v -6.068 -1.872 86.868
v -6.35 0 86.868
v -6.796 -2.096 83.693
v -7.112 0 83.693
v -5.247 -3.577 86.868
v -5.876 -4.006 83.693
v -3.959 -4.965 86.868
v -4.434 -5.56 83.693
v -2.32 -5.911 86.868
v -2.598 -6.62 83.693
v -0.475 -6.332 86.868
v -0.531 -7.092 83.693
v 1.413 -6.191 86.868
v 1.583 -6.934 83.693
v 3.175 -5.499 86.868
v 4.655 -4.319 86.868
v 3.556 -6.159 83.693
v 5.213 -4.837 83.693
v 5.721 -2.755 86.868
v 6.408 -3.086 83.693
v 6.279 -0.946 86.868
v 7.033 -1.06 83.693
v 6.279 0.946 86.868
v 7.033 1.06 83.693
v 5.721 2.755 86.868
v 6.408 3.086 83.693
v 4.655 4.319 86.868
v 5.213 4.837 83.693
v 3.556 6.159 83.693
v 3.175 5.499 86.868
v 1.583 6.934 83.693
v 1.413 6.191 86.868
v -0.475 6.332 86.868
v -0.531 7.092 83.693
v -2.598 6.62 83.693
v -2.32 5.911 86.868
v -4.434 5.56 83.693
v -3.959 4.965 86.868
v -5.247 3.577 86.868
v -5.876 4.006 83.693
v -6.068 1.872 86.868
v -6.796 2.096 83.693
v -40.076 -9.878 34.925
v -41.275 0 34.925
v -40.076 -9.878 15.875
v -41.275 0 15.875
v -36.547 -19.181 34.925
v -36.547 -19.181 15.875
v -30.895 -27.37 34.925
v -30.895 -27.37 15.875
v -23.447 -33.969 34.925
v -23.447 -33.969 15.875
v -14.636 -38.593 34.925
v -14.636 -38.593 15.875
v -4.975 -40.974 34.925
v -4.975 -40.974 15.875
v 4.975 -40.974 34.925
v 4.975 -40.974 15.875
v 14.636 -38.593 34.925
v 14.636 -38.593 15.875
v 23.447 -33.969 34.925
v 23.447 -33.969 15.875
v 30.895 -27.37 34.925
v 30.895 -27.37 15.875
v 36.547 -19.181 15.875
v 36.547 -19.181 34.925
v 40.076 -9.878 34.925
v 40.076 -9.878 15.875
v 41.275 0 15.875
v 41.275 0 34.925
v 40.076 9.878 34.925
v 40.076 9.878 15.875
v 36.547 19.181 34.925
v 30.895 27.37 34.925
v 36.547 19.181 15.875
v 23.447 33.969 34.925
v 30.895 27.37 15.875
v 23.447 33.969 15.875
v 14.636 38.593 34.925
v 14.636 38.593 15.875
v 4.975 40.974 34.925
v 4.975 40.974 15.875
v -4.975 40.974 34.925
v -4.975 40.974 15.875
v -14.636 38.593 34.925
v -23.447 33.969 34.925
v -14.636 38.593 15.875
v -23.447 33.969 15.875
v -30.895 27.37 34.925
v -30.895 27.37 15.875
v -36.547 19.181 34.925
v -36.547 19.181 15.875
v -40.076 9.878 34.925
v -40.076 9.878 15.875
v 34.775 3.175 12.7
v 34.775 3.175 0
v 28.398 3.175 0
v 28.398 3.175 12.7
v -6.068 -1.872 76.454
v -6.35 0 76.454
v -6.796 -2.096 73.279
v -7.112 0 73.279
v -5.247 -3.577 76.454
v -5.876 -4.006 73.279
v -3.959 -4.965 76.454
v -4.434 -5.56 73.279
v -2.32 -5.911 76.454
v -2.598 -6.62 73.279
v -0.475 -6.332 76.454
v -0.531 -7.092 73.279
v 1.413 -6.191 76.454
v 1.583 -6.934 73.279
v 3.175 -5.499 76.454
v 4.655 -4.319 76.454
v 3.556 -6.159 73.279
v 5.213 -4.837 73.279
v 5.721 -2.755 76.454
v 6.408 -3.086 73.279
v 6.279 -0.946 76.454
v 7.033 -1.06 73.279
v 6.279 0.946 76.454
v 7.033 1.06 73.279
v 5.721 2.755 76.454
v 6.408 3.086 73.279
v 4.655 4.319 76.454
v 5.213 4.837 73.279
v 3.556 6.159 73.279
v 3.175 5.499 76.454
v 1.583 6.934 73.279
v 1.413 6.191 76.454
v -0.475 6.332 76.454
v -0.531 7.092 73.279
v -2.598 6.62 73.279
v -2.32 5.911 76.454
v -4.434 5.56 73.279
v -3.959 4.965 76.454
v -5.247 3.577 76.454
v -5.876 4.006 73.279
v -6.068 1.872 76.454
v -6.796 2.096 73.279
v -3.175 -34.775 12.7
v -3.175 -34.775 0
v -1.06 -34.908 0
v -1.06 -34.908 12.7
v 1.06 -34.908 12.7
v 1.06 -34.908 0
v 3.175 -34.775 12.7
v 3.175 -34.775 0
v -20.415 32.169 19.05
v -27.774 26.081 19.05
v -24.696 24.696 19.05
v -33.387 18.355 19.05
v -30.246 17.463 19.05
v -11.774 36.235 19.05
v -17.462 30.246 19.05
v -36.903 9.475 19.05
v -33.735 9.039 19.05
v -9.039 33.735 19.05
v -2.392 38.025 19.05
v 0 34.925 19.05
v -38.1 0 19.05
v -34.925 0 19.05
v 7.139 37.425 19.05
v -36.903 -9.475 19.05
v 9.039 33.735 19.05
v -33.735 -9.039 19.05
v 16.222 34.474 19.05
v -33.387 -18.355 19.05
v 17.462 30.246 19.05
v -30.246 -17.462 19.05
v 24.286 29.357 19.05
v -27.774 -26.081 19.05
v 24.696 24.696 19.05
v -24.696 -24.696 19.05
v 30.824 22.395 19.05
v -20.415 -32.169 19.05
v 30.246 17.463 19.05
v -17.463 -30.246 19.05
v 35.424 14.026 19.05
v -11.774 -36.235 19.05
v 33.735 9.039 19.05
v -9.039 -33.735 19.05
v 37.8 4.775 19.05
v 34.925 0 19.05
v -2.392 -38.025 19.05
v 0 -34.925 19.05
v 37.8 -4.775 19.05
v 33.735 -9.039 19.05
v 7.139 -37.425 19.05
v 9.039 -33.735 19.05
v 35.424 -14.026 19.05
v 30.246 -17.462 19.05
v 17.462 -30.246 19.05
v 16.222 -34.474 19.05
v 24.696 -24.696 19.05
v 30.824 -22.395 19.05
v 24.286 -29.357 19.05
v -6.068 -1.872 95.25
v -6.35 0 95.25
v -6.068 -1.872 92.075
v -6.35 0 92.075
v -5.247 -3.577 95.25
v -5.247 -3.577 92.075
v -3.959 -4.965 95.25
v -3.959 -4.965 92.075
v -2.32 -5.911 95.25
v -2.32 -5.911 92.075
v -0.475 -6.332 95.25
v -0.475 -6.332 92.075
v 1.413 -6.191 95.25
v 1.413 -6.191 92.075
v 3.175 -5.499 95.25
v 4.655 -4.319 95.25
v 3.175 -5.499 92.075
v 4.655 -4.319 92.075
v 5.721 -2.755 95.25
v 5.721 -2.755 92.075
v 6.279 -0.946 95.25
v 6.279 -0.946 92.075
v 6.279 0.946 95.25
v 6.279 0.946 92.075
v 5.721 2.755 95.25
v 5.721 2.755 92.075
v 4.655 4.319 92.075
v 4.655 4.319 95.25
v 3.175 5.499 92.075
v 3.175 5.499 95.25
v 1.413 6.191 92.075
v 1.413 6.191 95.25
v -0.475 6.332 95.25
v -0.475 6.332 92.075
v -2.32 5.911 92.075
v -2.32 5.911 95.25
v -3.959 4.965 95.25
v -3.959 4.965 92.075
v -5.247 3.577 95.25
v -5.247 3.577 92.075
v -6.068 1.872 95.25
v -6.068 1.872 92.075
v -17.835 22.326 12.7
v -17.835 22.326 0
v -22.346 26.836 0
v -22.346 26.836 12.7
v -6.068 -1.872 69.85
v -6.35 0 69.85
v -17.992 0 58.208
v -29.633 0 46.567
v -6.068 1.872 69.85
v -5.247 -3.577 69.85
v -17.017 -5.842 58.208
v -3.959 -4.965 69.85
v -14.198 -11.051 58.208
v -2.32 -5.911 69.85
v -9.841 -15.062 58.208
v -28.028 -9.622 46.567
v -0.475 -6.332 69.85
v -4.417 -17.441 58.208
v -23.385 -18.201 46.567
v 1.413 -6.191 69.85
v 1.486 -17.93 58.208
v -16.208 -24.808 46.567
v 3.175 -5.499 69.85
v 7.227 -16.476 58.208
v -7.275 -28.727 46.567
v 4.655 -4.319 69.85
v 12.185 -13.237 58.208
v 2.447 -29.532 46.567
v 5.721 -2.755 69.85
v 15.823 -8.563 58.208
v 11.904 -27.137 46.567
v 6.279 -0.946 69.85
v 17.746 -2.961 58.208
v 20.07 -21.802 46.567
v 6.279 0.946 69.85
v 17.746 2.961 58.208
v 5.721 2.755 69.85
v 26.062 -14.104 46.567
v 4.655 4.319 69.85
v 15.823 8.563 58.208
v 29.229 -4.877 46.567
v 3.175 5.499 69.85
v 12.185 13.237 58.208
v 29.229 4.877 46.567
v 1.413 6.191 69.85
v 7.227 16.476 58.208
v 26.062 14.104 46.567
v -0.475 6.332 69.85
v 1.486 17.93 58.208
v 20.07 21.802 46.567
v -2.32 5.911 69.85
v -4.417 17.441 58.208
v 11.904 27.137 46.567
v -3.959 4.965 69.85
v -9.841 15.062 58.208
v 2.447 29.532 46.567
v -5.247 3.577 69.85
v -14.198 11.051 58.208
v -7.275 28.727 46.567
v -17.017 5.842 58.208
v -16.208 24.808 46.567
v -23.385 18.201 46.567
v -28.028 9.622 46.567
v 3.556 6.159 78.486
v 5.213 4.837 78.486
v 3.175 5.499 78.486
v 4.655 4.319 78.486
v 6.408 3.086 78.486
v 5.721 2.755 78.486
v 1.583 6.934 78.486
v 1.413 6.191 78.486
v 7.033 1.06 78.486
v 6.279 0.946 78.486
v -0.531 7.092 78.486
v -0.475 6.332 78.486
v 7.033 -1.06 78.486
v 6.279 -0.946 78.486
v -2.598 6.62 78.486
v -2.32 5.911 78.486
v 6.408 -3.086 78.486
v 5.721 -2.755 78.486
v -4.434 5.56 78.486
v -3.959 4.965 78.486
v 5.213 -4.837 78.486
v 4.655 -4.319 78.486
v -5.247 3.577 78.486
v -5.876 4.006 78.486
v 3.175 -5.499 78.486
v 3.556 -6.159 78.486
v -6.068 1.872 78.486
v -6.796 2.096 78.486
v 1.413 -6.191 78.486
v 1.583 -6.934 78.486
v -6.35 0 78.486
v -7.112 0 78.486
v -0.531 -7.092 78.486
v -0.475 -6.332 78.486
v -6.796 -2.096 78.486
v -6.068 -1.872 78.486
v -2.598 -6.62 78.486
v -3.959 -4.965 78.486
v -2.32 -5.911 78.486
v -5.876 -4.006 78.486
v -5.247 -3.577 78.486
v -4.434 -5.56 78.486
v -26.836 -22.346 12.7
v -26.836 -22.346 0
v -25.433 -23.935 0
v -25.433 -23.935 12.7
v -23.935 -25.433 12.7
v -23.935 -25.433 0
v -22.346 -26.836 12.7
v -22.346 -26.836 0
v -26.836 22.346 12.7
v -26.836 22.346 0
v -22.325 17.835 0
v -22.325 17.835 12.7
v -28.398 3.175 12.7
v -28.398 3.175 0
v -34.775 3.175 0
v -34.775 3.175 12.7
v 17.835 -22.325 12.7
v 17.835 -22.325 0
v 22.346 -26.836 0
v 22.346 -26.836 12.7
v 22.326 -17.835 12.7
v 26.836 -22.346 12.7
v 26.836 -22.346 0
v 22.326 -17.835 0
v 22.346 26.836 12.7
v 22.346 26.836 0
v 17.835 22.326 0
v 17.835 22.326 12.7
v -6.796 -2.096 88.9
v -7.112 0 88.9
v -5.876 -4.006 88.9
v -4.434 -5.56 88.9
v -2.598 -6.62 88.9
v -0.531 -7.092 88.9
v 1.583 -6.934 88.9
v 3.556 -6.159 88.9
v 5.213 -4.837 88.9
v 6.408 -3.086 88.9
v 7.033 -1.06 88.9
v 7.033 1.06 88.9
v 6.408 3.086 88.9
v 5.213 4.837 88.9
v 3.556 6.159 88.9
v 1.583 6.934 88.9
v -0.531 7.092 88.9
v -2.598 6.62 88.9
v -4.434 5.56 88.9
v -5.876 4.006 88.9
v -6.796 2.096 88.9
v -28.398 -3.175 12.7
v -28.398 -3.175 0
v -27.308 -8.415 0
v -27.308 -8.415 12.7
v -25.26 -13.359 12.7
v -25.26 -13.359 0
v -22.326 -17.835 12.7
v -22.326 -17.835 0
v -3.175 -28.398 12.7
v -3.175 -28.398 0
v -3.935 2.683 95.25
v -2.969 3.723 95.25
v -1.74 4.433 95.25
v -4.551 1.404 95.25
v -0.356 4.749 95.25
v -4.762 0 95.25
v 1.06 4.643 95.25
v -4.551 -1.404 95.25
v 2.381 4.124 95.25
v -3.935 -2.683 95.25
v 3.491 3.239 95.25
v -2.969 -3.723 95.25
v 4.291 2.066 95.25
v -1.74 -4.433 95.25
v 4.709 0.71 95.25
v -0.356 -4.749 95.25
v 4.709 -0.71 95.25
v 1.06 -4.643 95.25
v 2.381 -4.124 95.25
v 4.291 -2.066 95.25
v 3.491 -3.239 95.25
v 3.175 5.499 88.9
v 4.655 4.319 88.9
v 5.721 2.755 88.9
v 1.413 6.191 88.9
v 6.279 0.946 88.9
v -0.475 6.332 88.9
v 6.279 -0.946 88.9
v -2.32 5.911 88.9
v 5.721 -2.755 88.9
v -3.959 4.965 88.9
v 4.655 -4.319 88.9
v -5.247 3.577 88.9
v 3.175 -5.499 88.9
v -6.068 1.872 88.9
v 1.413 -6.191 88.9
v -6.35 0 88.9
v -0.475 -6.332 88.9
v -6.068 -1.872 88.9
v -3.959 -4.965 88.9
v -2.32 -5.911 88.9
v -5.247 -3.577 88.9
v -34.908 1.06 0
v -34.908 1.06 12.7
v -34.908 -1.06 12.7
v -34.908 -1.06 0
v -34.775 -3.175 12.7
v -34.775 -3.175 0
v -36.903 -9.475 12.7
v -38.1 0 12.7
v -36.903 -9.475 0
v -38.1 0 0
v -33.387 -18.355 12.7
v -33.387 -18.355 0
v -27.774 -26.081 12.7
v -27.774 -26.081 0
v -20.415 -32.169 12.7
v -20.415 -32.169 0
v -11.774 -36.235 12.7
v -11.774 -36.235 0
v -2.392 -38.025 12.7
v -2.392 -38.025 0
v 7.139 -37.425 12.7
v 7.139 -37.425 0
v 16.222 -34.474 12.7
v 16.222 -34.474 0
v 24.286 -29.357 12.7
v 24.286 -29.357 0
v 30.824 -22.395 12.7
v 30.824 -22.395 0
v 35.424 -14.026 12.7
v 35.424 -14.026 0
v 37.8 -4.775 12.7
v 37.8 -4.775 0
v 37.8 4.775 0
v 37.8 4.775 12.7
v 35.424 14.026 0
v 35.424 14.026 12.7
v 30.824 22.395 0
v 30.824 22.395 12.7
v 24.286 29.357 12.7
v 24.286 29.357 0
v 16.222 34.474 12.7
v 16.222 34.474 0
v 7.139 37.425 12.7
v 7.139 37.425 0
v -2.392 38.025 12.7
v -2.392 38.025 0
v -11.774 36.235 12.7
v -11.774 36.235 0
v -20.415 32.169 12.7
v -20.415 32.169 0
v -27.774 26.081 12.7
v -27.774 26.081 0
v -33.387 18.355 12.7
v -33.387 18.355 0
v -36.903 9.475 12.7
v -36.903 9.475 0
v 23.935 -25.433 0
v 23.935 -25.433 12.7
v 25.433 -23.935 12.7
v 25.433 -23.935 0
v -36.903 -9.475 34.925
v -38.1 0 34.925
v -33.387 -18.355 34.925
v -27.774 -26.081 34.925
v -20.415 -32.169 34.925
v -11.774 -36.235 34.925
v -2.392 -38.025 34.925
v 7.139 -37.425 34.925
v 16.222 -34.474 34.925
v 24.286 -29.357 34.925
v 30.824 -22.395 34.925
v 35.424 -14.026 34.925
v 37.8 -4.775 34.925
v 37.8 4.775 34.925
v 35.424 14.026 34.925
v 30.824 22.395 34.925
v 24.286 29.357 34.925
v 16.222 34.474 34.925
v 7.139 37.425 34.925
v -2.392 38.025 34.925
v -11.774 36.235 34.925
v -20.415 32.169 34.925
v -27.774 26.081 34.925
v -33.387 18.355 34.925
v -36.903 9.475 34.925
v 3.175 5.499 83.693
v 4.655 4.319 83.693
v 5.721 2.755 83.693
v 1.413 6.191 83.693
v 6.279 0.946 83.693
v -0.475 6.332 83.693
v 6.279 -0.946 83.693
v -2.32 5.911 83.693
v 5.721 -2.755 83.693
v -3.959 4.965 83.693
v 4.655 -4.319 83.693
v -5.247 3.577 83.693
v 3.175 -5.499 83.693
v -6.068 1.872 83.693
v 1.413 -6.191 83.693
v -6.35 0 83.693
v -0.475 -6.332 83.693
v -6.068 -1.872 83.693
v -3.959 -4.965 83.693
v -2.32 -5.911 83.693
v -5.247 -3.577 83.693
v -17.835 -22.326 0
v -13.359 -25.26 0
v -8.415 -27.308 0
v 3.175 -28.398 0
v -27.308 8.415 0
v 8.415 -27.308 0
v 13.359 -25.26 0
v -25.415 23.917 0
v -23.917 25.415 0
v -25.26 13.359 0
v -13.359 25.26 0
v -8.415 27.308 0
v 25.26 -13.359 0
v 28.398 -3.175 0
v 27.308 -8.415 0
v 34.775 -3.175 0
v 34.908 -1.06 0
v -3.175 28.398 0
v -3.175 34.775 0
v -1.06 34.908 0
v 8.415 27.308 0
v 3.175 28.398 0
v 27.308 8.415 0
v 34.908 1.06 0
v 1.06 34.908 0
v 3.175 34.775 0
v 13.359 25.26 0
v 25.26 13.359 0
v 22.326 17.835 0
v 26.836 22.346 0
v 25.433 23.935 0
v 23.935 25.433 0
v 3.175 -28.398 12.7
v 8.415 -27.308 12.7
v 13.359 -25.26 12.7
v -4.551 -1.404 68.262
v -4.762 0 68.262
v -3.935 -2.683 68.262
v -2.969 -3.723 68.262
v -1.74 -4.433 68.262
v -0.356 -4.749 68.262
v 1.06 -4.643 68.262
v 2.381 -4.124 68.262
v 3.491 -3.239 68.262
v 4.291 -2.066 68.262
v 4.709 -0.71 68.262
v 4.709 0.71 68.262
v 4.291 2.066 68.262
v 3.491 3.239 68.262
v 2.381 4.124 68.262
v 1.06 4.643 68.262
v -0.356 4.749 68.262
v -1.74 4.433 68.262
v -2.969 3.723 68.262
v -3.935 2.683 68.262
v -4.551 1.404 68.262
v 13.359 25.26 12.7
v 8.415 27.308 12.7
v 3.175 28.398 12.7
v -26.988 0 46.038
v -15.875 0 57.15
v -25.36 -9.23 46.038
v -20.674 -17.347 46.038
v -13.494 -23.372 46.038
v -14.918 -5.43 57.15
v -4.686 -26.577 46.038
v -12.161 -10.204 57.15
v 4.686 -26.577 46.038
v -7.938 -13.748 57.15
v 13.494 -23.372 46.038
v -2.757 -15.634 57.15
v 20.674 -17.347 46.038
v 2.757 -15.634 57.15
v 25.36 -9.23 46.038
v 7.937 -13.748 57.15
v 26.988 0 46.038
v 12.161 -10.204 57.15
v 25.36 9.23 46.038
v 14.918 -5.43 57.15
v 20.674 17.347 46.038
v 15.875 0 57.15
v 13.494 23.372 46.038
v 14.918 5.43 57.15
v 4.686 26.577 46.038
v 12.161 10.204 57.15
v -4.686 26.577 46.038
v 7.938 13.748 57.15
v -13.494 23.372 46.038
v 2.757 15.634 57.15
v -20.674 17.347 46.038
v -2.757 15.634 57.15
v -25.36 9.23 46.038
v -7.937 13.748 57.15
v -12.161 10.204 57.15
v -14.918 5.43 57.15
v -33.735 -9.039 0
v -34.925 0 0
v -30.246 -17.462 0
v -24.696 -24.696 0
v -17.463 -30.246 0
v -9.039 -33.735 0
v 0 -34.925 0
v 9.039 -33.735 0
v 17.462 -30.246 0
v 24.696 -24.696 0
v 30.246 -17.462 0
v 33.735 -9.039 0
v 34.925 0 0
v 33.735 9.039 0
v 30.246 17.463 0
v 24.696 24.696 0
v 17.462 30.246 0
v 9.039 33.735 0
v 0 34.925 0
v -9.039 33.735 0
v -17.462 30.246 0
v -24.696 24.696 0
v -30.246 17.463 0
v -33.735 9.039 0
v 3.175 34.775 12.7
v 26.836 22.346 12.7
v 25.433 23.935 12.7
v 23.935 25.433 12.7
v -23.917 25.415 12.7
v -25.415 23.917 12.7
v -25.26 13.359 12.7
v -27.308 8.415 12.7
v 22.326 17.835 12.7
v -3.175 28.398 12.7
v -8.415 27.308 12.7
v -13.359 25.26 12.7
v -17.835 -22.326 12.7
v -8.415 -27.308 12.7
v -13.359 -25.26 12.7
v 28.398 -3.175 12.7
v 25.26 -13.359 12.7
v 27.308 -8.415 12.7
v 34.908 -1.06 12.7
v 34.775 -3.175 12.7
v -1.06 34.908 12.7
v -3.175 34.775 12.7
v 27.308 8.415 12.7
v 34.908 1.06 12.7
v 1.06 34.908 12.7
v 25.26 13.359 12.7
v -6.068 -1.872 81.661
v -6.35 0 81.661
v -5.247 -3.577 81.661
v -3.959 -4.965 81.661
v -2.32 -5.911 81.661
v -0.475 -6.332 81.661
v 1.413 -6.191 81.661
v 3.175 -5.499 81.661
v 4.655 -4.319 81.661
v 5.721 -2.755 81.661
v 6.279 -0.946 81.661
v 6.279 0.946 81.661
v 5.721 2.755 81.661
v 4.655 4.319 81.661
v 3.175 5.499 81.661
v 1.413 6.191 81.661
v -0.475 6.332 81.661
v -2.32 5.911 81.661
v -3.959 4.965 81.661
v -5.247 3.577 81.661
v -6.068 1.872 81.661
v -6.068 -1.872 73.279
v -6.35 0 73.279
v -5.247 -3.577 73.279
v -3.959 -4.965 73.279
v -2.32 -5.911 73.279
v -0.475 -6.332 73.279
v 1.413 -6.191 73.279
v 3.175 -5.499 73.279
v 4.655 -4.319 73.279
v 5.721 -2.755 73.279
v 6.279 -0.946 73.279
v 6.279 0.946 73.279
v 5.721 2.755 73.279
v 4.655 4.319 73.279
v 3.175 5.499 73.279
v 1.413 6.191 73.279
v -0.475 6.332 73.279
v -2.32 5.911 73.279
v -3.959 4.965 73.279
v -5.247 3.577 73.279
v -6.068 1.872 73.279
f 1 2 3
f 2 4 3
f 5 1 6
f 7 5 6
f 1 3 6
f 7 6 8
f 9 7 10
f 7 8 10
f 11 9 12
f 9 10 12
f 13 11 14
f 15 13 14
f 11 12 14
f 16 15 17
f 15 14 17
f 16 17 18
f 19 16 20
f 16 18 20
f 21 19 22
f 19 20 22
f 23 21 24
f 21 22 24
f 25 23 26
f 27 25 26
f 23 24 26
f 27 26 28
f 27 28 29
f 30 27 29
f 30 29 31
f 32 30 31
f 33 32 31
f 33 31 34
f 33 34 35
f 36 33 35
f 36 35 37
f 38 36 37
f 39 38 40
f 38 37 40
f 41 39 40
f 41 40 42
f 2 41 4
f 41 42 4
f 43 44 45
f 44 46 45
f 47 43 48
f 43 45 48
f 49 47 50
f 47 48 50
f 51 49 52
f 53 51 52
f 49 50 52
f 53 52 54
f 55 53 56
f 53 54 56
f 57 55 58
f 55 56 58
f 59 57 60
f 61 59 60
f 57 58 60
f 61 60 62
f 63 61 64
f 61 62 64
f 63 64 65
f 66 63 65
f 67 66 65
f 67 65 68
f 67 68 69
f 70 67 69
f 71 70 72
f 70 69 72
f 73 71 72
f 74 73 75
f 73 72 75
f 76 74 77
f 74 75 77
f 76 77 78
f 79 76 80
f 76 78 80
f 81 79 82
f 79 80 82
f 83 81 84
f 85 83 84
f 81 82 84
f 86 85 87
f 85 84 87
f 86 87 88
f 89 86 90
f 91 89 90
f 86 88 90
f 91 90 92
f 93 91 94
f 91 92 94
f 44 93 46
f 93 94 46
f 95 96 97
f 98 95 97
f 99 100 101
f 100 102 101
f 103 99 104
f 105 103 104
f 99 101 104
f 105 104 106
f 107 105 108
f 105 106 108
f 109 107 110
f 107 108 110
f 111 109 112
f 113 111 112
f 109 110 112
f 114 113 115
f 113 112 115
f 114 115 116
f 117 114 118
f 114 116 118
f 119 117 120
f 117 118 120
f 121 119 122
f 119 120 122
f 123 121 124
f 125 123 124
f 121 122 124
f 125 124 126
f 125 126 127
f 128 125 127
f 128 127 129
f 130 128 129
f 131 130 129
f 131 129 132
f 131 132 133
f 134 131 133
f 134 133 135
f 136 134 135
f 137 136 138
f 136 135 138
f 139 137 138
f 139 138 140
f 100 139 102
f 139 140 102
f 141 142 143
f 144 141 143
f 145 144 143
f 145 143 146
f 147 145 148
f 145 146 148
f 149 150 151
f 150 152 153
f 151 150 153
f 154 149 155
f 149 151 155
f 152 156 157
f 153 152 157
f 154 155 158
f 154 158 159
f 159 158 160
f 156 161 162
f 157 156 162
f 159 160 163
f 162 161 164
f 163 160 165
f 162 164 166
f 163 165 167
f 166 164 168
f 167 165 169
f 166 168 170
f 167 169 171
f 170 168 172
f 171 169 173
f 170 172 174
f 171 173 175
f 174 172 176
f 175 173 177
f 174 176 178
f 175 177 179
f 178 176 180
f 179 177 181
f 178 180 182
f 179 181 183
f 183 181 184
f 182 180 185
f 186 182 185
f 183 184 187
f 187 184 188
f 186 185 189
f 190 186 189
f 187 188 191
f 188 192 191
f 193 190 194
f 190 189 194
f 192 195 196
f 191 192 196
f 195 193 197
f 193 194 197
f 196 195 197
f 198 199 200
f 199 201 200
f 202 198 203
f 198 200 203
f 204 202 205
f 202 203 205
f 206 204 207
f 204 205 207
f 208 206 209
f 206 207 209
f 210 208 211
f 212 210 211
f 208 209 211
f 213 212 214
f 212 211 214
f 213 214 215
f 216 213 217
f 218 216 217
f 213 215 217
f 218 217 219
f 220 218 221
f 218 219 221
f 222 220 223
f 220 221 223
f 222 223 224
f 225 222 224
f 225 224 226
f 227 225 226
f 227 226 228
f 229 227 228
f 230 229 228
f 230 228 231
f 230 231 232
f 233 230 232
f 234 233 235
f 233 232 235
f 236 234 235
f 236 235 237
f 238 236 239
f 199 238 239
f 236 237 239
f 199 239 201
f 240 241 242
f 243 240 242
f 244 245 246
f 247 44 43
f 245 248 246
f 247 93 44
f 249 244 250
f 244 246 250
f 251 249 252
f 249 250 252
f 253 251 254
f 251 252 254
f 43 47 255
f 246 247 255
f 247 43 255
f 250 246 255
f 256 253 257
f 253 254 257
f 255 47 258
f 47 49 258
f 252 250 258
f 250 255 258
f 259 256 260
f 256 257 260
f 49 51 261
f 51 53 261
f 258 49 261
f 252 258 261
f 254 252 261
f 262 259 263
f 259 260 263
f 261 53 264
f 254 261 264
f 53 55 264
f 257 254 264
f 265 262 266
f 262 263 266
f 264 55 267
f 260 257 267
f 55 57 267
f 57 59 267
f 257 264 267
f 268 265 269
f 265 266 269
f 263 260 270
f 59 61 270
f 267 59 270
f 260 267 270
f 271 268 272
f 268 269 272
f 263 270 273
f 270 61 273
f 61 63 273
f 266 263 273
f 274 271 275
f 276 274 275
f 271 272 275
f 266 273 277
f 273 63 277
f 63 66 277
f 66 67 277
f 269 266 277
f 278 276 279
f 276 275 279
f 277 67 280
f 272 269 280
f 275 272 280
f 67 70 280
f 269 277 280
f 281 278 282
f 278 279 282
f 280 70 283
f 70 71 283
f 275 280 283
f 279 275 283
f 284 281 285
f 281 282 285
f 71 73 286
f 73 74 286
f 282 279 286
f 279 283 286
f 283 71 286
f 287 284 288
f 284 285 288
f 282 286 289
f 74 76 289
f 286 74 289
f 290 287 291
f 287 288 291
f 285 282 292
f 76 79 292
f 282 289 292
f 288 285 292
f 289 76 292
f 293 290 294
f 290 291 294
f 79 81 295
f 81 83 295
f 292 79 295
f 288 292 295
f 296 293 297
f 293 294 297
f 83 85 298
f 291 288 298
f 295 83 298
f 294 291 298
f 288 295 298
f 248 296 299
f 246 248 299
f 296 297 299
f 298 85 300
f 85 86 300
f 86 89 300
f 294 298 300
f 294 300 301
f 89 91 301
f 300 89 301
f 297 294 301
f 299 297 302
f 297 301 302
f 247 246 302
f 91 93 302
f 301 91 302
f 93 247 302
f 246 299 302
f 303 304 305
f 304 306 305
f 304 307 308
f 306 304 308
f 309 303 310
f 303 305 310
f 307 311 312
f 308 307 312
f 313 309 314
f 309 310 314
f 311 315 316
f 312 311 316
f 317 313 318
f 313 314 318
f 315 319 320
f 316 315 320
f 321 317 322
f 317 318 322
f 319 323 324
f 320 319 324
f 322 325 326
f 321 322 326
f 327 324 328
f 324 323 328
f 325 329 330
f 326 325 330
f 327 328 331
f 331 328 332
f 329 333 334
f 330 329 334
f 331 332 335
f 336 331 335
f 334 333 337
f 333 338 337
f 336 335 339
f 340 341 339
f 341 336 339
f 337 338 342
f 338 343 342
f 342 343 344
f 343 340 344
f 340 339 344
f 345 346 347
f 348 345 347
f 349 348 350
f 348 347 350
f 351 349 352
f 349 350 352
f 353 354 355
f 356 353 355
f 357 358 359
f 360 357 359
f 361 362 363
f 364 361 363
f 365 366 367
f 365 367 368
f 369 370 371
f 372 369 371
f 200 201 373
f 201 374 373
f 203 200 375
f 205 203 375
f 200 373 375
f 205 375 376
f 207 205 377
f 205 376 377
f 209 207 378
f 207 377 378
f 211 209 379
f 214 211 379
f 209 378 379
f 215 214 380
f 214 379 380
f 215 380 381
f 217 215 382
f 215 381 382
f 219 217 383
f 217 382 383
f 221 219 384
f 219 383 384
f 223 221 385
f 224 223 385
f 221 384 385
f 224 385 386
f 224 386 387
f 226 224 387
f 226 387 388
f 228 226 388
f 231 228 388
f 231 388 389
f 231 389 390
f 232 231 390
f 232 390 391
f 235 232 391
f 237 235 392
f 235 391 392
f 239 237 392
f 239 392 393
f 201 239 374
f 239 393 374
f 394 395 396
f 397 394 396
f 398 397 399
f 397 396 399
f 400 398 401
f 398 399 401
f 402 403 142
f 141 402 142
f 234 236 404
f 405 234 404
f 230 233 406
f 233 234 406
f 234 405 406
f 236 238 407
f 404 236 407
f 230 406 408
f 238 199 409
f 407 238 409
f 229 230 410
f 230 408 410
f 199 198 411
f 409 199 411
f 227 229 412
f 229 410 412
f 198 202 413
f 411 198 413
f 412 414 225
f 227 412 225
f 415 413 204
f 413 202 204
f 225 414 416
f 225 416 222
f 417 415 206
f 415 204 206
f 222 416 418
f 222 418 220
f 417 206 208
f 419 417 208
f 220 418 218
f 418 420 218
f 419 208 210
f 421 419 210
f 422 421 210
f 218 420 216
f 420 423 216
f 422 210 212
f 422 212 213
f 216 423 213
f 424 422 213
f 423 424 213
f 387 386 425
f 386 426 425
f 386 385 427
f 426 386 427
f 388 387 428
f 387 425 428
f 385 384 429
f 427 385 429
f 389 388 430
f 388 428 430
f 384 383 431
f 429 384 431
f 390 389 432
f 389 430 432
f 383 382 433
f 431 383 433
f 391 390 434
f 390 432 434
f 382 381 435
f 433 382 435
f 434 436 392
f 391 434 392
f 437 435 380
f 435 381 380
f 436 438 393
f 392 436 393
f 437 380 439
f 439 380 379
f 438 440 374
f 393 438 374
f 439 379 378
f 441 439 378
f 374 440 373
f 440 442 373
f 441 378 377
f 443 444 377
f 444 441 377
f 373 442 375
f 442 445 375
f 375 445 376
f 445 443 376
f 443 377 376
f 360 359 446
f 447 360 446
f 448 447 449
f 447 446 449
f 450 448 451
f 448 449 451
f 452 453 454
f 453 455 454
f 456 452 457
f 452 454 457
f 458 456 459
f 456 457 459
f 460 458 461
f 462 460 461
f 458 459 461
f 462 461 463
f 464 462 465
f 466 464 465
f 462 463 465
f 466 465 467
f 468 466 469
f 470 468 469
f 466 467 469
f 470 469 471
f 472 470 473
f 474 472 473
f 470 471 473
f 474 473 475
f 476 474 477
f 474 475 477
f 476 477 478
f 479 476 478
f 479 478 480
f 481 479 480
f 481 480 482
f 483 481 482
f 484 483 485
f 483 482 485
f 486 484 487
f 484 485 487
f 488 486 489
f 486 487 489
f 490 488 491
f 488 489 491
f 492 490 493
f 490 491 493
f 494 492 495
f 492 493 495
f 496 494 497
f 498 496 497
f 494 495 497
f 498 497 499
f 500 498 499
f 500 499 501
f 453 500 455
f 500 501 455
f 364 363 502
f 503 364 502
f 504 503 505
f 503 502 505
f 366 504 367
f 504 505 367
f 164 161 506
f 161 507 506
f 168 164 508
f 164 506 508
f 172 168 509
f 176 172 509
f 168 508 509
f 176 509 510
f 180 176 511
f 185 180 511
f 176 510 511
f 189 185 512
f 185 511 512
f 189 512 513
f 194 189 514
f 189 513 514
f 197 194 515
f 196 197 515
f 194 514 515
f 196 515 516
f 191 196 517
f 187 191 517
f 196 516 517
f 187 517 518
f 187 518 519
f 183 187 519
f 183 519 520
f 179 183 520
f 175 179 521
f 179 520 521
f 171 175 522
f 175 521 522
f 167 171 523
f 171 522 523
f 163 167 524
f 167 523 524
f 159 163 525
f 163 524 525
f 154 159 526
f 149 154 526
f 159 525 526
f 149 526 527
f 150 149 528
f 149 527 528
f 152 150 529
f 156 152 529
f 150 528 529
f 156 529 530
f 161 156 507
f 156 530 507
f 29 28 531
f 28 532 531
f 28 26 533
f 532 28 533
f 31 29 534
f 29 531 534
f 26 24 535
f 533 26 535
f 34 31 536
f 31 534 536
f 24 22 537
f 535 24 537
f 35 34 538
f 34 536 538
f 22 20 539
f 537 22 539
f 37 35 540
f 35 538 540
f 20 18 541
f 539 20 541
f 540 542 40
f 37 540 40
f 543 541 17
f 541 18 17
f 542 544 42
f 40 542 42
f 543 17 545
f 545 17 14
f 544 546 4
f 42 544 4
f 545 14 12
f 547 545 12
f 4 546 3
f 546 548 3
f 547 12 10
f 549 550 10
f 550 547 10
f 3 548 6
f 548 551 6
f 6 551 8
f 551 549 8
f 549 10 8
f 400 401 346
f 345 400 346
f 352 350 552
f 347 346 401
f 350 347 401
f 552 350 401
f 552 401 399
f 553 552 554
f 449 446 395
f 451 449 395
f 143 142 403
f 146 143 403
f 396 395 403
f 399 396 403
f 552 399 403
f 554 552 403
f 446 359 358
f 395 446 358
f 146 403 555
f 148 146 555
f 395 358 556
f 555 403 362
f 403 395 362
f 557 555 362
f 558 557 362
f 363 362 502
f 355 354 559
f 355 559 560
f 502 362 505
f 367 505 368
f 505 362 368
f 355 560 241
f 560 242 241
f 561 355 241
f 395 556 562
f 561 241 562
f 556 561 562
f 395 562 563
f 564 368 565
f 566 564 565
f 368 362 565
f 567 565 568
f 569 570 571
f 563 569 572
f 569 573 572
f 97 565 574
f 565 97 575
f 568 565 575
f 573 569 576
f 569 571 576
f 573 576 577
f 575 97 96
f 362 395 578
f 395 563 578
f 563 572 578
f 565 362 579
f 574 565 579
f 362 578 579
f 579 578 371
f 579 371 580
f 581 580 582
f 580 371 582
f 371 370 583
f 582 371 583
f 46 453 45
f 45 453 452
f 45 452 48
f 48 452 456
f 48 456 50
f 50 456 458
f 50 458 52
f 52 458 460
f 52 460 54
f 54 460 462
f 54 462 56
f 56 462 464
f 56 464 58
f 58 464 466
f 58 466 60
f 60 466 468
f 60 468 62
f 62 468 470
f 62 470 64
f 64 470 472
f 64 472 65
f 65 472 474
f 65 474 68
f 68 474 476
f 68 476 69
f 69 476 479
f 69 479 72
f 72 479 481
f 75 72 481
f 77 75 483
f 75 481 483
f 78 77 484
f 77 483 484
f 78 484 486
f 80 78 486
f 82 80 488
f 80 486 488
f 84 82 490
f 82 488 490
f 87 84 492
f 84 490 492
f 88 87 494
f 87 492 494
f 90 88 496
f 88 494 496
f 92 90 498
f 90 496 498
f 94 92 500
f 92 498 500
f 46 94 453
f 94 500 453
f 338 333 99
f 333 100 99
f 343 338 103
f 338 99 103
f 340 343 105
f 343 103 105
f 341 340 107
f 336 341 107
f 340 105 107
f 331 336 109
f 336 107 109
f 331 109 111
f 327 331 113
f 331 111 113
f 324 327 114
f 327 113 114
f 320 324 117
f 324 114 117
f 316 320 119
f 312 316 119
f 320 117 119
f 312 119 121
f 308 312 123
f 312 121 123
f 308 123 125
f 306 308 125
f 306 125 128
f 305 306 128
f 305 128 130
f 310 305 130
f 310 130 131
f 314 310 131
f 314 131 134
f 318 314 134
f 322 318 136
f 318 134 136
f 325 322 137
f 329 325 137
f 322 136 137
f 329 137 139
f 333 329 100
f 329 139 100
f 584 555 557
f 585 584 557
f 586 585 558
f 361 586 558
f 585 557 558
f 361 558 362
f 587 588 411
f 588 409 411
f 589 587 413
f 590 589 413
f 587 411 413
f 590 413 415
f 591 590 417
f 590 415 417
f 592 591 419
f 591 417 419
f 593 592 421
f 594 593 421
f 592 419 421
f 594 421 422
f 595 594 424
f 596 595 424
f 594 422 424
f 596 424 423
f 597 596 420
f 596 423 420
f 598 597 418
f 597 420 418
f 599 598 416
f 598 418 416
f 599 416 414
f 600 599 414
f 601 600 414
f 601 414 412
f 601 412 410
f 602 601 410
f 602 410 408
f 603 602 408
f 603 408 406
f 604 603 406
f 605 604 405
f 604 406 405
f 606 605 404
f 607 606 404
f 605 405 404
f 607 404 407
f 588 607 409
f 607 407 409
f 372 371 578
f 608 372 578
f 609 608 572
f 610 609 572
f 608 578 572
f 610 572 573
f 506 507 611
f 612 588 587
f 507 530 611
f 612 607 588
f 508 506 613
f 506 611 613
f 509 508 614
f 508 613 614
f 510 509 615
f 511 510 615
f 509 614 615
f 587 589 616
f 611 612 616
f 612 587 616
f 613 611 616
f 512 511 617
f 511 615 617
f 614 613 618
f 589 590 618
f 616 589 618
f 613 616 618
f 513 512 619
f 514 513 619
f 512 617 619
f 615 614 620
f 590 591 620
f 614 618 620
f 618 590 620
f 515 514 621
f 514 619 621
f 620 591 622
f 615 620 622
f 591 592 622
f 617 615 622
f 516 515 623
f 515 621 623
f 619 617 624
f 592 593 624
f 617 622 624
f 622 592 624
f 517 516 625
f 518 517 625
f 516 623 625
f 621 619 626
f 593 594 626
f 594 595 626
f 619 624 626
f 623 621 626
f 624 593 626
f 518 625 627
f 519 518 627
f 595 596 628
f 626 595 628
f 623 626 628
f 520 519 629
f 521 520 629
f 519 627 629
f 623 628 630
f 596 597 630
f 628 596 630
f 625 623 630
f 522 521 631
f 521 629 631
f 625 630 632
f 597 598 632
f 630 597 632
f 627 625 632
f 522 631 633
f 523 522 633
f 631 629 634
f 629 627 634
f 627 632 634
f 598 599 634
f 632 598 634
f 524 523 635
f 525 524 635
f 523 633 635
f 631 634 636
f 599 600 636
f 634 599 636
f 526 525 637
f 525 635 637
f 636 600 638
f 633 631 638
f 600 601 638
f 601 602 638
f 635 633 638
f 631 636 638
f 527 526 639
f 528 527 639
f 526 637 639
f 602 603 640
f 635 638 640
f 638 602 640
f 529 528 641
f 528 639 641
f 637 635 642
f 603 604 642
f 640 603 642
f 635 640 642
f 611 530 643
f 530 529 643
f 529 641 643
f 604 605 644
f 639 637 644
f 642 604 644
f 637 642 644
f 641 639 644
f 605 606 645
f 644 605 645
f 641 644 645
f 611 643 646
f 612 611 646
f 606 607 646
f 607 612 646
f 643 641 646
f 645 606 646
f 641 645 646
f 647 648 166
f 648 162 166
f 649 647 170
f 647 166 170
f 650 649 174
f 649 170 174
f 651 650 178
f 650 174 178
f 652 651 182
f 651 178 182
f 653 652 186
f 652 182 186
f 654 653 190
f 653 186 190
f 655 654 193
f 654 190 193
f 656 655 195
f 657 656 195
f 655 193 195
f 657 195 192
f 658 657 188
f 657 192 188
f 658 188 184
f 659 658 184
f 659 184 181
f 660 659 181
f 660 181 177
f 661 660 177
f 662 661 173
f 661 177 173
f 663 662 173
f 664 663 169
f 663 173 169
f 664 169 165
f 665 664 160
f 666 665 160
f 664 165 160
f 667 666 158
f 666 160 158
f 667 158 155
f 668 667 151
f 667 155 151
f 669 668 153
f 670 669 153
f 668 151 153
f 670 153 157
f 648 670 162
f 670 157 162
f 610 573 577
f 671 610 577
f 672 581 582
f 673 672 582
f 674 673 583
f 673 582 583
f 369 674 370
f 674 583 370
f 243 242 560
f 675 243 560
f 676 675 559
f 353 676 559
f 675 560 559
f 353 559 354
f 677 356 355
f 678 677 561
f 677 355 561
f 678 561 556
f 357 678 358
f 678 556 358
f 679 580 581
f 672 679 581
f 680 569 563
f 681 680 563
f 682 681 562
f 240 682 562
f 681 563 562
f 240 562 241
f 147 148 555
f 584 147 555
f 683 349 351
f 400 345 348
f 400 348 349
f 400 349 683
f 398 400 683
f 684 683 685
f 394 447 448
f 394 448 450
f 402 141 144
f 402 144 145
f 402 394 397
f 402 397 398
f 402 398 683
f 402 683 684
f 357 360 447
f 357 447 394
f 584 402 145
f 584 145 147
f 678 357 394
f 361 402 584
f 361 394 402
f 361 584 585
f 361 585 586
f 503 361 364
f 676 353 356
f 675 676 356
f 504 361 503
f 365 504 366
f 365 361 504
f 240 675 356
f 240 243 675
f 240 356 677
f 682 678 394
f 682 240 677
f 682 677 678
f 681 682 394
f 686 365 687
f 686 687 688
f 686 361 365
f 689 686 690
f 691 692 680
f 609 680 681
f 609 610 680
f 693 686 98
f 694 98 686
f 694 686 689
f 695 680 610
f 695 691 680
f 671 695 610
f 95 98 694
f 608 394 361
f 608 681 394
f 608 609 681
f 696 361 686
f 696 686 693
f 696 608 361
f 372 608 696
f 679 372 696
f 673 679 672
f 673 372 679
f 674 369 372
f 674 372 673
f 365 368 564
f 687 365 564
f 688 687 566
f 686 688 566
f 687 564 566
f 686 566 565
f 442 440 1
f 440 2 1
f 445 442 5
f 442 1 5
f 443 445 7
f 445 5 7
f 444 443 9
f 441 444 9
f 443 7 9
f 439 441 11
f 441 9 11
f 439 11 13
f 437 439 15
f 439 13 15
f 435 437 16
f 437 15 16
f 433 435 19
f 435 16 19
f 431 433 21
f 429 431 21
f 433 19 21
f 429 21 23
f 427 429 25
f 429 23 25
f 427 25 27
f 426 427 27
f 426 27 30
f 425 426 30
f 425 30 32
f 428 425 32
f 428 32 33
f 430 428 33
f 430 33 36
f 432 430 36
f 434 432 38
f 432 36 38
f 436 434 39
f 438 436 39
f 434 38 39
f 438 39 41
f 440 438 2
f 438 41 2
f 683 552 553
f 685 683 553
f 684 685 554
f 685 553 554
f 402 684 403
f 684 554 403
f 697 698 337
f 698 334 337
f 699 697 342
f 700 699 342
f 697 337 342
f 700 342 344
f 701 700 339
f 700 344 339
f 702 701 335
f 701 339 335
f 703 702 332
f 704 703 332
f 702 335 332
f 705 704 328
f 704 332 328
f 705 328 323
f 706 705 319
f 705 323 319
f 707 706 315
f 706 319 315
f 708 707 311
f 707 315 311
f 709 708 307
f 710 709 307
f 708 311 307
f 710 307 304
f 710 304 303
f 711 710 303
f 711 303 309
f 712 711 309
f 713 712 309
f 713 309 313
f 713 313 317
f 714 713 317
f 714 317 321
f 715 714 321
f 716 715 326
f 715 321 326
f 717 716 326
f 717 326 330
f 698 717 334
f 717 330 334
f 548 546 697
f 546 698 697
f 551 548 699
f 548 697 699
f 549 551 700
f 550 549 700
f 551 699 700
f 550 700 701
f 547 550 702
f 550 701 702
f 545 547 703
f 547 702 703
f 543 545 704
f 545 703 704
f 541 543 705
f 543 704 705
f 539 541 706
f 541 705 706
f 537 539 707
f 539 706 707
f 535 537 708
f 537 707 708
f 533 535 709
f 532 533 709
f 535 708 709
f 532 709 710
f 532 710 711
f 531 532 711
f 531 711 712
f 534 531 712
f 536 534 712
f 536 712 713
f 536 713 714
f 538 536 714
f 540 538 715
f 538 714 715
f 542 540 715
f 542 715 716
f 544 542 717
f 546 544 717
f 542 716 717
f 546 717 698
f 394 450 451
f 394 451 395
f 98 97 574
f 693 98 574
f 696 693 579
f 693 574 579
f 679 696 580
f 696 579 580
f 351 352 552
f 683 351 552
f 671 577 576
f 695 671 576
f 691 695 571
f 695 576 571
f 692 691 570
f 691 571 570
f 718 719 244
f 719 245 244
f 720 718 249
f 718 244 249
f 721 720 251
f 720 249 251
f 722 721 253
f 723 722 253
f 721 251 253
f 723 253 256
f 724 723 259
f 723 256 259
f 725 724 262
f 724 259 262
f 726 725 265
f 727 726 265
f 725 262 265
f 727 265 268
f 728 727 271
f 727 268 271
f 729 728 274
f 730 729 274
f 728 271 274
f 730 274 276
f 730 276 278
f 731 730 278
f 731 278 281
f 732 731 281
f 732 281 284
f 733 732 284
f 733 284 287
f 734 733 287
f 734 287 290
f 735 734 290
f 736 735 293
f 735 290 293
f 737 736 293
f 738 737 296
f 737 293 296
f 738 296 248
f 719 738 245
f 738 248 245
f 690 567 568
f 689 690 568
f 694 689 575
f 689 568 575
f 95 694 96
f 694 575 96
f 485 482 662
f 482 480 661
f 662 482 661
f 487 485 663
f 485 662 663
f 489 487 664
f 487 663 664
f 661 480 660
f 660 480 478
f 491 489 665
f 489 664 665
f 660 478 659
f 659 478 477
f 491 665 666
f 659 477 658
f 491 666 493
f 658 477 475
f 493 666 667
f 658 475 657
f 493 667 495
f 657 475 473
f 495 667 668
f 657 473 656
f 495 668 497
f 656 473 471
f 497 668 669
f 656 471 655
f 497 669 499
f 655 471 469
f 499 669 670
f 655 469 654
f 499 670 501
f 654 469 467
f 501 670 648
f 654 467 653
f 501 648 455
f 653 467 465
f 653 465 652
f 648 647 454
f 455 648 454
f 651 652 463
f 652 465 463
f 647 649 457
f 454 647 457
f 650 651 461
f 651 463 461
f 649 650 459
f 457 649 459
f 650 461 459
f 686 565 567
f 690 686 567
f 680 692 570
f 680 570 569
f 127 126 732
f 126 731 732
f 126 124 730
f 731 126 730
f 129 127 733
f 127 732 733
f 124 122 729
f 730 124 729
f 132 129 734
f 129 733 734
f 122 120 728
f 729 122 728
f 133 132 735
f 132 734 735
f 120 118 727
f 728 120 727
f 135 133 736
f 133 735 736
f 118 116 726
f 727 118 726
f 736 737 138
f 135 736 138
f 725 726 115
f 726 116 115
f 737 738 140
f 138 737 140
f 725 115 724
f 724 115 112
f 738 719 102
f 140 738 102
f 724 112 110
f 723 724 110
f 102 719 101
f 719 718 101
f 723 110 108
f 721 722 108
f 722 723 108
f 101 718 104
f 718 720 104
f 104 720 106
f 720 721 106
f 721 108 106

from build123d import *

# Parameters (mm, degrees)
F3_DEPTH = 12.7


with BuildPart() as f1:
    # F0 (on Front) → F1 (revolve)
    with BuildSketch(Plane.XZ):
        Polygon((-38.1, 0), (-34.925, 0), (-34.925, 19.05), (-38.1, 19.05), (-38.1, 34.925), (-4.7625, 68.2625), (-4.7625, 95.25), (-6.35, 95.25), (-6.35, 92.075), (-7.112, 88.9), (-6.35, 88.9), (-6.35, 86.868), (-7.112, 83.693), (-6.35, 83.693), (-6.35, 81.661), (-7.112, 78.486), (-6.35, 78.486), (-6.35, 76.454), (-7.112, 73.279), (-6.35, 73.279), (-6.35, 69.85), (-41.275, 34.925), (-41.275, 15.875), (-38.1, 12.7), align=None)
    revolve(axis=Axis((0, 0, 50.8), (0, 0, 1)))


with BuildPart() as f3:
    # F2 (on Top) → F3 (new body)
    with BuildSketch(Plane.XY):
        with BuildLine():
            Line((-3.1749960745, -28.3980637531), (-3.1749960745, -34.7751258129))
            ThreePointArc((-3.1749960745, -34.7751258129), (2.24367e-05, -34.9249723343), (3.1750395166, -34.7750954884))
            Line((3.1750395166, -34.7750954884), (3.1750409639, -28.3980587343))
            ThreePointArc((3.1750409639, -28.3980587343), (10.9352255737, -26.3998383831), (17.8354455442, -22.3254900783))
            Line((17.8354455442, -22.3254900783), (22.3460920856, -26.8361386672))
            ThreePointArc((22.3460920856, -26.8361386672), (24.695725028, -24.6956852351), (26.8361753226, -22.3460494346))
            Line((26.8361753226, -22.3460494346), (22.3255262075, -17.8354003195))
            ThreePointArc((22.3255262075, -17.8354003195), (26.3998576023, -10.9351791745), (28.3980634632, -3.1749986674))
            Line((28.3980634632, -3.1749986674), (34.7751405906, -3.1749986674))
            ThreePointArc((34.7751405906, -3.1749986674), (34.925, 1.3605e-06), (34.7751394094, 3.1750013326))
            Line((34.7751394094, 3.1750013326), (28.3980631653, 3.1750013326))
            ThreePointArc((28.3980631653, 3.1750013326), (26.3998585218, 10.9351769545), (22.3255308809, 17.8353944696))
            Line((22.3255308809, 17.8353944696), (26.8361885113, 22.3460520999))
            ThreePointArc((26.8361885113, 22.3460520999), (24.6957050465, 24.6957139393), (22.3460476901, 26.8362023251))
            Line((22.3460476901, 26.8362023251), (17.835384339, 22.325538974))
            ThreePointArc((17.835384339, 22.325538974), (10.9351680084, 26.3998622274), (3.1749949722, 28.3980638764))
            Line((3.1749949722, 28.3980638764), (3.1749949722, 34.7751420859))
            ThreePointArc((3.1749949722, 34.7751420859), (1.3068e-06, 34.9250056515), (-3.17499275, 34.7751503786))
            Line((-3.17499275, 34.7751503786), (-3.17499275, 28.3980641248))
            ThreePointArc((-3.17499275, 28.3980641248), (-10.9351754232, 26.3998591561), (-17.8353986269, 22.3255275597))
            Line((-17.8353986269, 22.3255275597), (-22.3460490284, 26.8361779611))
            ThreePointArc((-22.3460490284, 26.8361779611), (-24.6756495106, 24.6756879964), (-26.8361394753, 22.3460875142))
            Line((-26.8361394753, 22.3460875142), (-22.3254933767, 17.8354414156))
            ThreePointArc((-22.3254933767, 17.8354414156), (-26.3998402061, 10.9352211725), (-28.3980592058, 3.1750367469))
            Line((-28.3980592058, 3.1750367469), (-34.7751006475, 3.1750367469))
            ThreePointArc((-34.7751006475, 3.1750367469), (-34.9249999999, 1.72484e-05), (-34.7751458819, -3.1750043854))
            Line((-34.7751458819, -3.1750043854), (-28.3980628239, -3.1750043854))
            ThreePointArc((-28.3980628239, -3.1750043854), (-26.3998554001, -10.935184491), (-22.3255226152, -17.8354048162))
            Line((-22.3255226152, -17.8354048162), (-26.8361646407, -22.3460468418))
            ThreePointArc((-26.8361646407, -22.3460468418), (-24.6956947976, -24.6956947976), (-22.3460468418, -26.8361646407))
            Line((-22.3460468418, -26.8361646407), (-17.8354048162, -22.3255226152))
            ThreePointArc((-17.8354048162, -22.3255226152), (-10.9351806279, -26.3998570003), (-3.1749960745, -28.3980637531))
        make_face()
    extrude(amount=F3_DEPTH)


solid = Compound([f1.part, f3.part])
